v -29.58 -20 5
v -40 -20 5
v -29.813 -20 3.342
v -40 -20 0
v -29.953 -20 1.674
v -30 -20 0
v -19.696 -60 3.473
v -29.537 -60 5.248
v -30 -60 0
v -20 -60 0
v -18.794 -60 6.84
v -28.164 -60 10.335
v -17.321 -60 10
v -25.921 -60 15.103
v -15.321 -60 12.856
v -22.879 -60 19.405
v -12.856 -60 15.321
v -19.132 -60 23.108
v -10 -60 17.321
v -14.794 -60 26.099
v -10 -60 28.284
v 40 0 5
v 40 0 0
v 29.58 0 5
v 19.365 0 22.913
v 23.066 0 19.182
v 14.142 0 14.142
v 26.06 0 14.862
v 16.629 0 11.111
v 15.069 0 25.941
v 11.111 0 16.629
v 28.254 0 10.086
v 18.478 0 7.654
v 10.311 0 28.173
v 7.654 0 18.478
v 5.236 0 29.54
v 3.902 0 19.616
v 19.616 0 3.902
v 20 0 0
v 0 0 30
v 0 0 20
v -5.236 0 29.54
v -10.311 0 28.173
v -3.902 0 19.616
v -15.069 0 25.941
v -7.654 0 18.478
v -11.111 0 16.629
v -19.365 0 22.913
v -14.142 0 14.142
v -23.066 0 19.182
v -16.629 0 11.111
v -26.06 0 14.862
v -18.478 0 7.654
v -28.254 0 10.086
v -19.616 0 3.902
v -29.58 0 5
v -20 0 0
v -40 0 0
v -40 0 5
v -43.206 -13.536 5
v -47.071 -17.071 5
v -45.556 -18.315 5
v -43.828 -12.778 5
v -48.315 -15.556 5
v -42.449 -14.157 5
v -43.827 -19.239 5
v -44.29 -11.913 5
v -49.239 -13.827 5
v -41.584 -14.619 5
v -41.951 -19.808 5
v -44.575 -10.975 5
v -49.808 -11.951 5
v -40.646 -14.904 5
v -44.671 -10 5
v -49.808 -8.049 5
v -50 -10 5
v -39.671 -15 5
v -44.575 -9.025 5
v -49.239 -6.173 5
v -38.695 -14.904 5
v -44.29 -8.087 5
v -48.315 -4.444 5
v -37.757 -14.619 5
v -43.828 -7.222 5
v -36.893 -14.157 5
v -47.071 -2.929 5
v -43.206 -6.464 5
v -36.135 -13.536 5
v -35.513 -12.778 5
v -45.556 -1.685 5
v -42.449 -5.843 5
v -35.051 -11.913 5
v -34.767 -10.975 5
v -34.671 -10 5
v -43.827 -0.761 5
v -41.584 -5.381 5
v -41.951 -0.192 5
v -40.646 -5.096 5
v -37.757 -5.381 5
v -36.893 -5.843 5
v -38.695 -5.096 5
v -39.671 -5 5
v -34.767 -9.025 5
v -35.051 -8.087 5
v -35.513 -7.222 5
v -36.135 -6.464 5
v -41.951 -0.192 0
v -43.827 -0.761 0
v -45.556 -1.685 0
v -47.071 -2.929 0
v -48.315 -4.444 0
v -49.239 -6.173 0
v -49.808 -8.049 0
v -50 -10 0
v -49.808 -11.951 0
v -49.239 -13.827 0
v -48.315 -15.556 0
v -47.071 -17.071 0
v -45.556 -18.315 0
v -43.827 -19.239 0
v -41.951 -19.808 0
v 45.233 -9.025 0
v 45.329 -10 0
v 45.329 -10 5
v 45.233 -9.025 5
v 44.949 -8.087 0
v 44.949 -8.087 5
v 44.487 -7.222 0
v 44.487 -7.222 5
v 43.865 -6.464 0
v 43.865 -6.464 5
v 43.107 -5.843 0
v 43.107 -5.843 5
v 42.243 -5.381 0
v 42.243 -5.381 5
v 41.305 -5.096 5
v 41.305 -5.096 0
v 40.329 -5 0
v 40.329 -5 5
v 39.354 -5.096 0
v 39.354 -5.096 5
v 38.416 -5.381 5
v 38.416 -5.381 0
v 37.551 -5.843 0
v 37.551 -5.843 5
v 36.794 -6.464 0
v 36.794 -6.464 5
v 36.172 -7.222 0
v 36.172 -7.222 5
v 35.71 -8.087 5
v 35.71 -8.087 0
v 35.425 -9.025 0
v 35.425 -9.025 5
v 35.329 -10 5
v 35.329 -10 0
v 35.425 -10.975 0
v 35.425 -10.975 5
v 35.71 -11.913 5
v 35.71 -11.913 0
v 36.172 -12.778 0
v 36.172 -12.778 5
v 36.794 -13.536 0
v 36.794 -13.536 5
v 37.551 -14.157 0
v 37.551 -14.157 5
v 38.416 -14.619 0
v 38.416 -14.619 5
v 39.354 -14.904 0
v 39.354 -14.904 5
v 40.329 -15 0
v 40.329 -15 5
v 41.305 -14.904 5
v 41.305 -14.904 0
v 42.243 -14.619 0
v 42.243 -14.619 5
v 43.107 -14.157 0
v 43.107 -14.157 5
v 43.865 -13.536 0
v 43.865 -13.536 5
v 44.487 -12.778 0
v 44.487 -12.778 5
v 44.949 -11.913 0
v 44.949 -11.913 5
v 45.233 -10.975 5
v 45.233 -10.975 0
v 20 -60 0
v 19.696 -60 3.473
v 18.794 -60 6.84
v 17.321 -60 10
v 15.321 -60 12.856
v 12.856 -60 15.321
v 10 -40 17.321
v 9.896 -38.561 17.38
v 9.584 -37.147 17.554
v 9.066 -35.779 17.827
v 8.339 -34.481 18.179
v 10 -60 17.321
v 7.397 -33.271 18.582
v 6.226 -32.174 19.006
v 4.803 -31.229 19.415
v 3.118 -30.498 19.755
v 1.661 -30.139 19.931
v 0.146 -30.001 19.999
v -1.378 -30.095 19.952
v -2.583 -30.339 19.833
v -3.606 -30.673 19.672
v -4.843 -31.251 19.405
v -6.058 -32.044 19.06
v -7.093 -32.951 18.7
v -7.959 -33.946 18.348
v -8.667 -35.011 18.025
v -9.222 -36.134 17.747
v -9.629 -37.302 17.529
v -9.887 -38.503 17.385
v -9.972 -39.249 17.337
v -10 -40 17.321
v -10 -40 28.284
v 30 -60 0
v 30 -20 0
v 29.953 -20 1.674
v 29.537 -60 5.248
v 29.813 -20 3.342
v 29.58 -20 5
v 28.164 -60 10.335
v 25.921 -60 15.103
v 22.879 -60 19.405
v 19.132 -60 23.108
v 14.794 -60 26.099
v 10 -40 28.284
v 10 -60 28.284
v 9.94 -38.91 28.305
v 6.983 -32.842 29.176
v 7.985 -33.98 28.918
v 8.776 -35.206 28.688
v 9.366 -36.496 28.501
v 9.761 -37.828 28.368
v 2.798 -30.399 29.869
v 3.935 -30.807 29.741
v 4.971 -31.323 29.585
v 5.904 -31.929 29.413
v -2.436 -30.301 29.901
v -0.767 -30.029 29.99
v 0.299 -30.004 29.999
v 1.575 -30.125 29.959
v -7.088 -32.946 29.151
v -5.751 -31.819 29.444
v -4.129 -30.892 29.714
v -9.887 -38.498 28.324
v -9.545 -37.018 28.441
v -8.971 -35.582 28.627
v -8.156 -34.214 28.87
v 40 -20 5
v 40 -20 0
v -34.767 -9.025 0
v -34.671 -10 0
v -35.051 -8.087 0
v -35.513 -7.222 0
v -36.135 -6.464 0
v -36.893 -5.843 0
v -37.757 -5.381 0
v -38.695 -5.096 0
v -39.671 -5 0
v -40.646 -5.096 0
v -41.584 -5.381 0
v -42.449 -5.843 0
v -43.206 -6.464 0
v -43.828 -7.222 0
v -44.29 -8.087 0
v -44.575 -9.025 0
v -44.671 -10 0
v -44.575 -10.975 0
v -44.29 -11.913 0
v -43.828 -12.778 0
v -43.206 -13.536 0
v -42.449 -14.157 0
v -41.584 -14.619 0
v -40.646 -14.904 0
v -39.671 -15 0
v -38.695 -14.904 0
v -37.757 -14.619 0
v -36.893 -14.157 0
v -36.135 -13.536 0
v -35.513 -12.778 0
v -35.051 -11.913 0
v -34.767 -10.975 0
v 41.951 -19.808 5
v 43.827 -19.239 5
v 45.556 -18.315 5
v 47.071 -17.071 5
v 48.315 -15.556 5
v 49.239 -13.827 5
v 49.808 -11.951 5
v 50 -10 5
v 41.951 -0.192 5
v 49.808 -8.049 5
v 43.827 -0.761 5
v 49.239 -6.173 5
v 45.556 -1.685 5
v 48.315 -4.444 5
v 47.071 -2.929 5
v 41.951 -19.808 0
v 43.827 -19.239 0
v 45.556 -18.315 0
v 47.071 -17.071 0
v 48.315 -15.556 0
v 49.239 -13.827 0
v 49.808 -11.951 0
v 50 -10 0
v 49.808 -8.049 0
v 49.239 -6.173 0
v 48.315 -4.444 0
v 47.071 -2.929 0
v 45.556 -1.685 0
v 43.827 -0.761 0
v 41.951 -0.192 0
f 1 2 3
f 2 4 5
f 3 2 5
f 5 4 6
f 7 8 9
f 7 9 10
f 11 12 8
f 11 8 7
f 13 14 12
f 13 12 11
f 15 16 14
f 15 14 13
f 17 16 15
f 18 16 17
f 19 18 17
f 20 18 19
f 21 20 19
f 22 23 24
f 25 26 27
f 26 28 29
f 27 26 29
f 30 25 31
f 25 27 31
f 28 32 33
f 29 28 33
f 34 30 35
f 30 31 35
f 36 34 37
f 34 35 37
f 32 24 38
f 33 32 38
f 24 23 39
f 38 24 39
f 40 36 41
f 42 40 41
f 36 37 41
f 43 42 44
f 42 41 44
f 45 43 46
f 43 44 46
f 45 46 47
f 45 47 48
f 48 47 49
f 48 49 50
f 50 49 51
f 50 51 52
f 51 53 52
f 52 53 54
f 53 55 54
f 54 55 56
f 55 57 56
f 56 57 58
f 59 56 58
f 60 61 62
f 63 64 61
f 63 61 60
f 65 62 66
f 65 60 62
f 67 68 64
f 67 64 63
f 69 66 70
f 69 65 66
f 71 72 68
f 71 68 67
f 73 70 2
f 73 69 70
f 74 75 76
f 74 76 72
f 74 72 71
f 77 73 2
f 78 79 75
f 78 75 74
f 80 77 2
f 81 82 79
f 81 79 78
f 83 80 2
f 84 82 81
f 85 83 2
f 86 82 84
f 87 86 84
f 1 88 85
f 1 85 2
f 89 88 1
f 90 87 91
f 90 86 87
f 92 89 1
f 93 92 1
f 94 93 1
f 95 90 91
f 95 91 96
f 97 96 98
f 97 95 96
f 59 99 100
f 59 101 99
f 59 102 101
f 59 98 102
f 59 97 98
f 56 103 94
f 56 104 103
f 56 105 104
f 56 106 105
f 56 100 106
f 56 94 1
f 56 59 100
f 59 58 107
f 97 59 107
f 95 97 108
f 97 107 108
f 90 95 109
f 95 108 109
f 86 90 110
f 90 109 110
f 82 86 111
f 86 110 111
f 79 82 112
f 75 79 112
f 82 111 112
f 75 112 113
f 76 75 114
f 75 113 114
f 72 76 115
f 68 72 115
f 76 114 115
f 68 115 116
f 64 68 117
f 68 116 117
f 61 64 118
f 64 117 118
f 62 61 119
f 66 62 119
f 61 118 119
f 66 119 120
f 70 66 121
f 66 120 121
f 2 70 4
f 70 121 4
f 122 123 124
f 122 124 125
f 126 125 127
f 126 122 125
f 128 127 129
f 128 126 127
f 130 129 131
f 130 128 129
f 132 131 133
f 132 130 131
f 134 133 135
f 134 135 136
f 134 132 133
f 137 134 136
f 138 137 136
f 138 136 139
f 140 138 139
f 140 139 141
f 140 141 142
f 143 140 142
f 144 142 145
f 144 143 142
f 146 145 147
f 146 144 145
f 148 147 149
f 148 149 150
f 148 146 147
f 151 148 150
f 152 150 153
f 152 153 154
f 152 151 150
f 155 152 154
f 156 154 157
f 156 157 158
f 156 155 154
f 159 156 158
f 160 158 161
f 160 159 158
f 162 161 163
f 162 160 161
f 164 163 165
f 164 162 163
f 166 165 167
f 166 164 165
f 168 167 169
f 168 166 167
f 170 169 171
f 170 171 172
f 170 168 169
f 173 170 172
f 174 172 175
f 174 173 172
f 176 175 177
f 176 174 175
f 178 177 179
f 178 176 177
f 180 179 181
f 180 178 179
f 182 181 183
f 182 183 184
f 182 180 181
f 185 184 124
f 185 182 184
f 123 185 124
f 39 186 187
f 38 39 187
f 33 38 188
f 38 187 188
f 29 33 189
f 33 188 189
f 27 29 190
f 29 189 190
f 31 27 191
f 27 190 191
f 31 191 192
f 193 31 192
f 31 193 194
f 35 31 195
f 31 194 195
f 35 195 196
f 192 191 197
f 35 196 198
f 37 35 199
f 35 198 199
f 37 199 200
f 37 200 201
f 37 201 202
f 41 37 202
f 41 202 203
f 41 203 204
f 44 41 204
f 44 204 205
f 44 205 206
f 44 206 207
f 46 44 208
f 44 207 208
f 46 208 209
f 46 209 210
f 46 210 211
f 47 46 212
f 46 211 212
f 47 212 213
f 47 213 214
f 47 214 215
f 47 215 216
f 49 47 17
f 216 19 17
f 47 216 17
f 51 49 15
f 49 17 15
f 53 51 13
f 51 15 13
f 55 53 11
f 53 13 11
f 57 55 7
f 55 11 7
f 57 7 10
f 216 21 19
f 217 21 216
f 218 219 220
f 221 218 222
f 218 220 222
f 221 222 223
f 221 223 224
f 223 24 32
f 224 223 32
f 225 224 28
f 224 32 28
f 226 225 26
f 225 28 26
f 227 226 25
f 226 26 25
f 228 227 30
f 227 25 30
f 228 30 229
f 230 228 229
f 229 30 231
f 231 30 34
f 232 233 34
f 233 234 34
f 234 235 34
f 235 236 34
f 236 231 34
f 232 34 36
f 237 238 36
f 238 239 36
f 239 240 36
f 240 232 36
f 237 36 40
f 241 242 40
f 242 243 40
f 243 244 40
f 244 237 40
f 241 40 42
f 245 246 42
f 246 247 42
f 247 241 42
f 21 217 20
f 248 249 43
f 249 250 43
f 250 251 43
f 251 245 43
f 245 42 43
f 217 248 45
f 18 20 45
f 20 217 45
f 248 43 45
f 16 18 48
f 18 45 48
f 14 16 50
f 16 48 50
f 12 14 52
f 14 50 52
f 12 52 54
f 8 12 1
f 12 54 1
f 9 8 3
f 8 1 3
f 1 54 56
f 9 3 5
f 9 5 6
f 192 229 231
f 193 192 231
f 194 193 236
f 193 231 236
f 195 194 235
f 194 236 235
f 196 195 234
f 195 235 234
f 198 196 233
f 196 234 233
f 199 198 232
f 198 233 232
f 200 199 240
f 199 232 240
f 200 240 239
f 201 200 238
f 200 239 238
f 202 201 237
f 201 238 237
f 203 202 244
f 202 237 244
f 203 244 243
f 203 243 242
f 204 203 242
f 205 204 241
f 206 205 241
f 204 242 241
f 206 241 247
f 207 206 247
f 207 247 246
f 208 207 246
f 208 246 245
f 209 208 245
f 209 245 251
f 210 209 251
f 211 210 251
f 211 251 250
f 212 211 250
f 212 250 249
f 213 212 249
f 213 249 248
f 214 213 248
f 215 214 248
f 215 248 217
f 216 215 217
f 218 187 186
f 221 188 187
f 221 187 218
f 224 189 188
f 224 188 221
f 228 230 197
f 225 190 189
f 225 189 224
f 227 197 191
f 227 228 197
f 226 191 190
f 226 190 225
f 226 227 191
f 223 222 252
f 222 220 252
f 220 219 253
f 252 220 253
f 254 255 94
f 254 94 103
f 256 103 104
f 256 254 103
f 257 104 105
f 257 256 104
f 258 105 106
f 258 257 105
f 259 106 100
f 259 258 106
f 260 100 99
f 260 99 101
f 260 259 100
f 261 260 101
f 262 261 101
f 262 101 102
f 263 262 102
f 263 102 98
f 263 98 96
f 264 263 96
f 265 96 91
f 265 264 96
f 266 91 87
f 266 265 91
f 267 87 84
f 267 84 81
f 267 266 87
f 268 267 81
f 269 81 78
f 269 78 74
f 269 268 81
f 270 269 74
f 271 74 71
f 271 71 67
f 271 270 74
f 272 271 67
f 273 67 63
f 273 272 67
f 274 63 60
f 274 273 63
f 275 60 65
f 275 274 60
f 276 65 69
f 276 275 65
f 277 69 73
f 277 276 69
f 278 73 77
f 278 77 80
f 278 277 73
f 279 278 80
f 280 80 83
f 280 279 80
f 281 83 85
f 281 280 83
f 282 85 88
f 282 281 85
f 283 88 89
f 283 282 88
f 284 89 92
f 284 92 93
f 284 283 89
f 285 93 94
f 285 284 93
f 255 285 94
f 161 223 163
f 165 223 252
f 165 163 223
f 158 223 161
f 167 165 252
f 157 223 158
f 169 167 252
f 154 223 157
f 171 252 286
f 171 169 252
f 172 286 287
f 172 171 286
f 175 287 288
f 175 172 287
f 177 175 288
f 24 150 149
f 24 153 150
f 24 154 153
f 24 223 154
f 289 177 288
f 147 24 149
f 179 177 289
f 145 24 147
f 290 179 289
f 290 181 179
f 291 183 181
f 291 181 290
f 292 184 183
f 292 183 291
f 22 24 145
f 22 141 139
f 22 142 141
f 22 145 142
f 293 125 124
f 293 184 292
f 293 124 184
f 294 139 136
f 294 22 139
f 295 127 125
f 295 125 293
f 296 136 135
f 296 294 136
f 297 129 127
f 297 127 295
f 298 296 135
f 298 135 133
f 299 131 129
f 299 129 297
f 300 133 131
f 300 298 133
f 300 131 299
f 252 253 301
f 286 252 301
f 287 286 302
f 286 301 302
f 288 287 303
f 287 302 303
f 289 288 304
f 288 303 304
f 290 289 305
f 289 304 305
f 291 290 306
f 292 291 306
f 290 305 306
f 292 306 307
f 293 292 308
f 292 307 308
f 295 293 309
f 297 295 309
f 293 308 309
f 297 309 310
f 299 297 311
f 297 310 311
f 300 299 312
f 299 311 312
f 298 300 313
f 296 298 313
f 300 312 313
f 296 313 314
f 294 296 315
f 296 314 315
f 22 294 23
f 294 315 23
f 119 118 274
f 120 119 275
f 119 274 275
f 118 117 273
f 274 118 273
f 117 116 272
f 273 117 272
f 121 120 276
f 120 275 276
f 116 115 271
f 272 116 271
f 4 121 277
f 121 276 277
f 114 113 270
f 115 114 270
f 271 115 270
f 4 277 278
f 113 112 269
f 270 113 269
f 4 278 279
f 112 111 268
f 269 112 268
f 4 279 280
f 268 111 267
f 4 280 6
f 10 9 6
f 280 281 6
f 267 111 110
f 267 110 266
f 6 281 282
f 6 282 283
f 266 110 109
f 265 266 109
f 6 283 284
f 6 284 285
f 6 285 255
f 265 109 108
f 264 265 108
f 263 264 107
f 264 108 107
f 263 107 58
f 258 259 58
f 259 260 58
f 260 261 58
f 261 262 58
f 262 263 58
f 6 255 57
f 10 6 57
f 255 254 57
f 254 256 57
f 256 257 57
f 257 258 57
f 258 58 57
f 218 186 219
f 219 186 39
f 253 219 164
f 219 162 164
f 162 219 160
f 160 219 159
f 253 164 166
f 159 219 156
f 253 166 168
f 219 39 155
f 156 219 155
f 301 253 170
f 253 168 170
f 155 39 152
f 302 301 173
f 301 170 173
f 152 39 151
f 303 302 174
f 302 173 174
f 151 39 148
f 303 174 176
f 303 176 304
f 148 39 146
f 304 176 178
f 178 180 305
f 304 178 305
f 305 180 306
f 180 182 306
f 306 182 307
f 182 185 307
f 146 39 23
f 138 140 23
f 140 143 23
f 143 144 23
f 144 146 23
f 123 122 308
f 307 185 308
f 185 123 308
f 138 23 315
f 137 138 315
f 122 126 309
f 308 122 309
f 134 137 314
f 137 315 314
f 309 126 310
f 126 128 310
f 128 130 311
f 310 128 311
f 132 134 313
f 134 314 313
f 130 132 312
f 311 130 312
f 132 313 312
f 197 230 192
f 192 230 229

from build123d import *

# Parameters (mm, degrees)
F0_R      = 30
F1_DEPTH  = 60
F3_DEPTH  = 60
F4_R      = 5
F5_DEPTH  = 5
F7_DEPTH  = 60
F10_W     = 20
F10_H     = 40
F11_DEPTH = 25


with BuildPart() as f1:
    # F0 (on Front) → F1 (new body)
    with BuildSketch(Plane.XZ):
        Circle(F0_R)
    extrude(amount=F1_DEPTH)

    # F2 (on face) → F3 (cut, through all)
    with BuildSketch(Plane.XZ.offset(60)):
        with BuildLine():
            Line((30, 0), (-30, 0))
            ThreePointArc((-30, 0), (0, -30), (30, 0))
        make_face()
    extrude(amount=-F3_DEPTH, mode=Mode.SUBTRACT)

    # F4 (on Top) → F5 (join)
    with BuildSketch(Plane.XY):
        with BuildLine():
            Line((40, 0), (-40, 0))
            ThreePointArc((-40, 0), (-50, -10), (-40, -20))
            Line((-40, -20), (40, -20))
            ThreePointArc((40, -20), (50, -10), (40, 0))
        make_face()
        with Locations((-39.6707831735, -10)):
            Circle(F4_R, mode=Mode.SUBTRACT)
        with Locations((40.3292197076, -10)):
            Circle(F4_R, mode=Mode.SUBTRACT)
    extrude(amount=F5_DEPTH)

    # F6 (on face) → F7 (cut, through all)
    with BuildSketch(Plane.XZ.offset(60)):
        with BuildLine():
            Line((-20, 0), (20, 0))
            ThreePointArc((20, 0), (0, 20), (-20, 0))
        make_face()
    extrude(amount=-F7_DEPTH, mode=Mode.SUBTRACT)

    # F10 (on plane+point) → F11 (cut)
    with BuildSketch(Plane.XY.offset(30)):
        with BuildLine():
            Line((-10, -40), (10, -40))
            ThreePointArc((10, -40), (0, -30), (-10, -40))
        make_face()
        with Locations((0, -60)):
            Rectangle(F10_W, F10_H)
    extrude(amount=-F11_DEPTH, mode=Mode.SUBTRACT)


solid = f1.part
